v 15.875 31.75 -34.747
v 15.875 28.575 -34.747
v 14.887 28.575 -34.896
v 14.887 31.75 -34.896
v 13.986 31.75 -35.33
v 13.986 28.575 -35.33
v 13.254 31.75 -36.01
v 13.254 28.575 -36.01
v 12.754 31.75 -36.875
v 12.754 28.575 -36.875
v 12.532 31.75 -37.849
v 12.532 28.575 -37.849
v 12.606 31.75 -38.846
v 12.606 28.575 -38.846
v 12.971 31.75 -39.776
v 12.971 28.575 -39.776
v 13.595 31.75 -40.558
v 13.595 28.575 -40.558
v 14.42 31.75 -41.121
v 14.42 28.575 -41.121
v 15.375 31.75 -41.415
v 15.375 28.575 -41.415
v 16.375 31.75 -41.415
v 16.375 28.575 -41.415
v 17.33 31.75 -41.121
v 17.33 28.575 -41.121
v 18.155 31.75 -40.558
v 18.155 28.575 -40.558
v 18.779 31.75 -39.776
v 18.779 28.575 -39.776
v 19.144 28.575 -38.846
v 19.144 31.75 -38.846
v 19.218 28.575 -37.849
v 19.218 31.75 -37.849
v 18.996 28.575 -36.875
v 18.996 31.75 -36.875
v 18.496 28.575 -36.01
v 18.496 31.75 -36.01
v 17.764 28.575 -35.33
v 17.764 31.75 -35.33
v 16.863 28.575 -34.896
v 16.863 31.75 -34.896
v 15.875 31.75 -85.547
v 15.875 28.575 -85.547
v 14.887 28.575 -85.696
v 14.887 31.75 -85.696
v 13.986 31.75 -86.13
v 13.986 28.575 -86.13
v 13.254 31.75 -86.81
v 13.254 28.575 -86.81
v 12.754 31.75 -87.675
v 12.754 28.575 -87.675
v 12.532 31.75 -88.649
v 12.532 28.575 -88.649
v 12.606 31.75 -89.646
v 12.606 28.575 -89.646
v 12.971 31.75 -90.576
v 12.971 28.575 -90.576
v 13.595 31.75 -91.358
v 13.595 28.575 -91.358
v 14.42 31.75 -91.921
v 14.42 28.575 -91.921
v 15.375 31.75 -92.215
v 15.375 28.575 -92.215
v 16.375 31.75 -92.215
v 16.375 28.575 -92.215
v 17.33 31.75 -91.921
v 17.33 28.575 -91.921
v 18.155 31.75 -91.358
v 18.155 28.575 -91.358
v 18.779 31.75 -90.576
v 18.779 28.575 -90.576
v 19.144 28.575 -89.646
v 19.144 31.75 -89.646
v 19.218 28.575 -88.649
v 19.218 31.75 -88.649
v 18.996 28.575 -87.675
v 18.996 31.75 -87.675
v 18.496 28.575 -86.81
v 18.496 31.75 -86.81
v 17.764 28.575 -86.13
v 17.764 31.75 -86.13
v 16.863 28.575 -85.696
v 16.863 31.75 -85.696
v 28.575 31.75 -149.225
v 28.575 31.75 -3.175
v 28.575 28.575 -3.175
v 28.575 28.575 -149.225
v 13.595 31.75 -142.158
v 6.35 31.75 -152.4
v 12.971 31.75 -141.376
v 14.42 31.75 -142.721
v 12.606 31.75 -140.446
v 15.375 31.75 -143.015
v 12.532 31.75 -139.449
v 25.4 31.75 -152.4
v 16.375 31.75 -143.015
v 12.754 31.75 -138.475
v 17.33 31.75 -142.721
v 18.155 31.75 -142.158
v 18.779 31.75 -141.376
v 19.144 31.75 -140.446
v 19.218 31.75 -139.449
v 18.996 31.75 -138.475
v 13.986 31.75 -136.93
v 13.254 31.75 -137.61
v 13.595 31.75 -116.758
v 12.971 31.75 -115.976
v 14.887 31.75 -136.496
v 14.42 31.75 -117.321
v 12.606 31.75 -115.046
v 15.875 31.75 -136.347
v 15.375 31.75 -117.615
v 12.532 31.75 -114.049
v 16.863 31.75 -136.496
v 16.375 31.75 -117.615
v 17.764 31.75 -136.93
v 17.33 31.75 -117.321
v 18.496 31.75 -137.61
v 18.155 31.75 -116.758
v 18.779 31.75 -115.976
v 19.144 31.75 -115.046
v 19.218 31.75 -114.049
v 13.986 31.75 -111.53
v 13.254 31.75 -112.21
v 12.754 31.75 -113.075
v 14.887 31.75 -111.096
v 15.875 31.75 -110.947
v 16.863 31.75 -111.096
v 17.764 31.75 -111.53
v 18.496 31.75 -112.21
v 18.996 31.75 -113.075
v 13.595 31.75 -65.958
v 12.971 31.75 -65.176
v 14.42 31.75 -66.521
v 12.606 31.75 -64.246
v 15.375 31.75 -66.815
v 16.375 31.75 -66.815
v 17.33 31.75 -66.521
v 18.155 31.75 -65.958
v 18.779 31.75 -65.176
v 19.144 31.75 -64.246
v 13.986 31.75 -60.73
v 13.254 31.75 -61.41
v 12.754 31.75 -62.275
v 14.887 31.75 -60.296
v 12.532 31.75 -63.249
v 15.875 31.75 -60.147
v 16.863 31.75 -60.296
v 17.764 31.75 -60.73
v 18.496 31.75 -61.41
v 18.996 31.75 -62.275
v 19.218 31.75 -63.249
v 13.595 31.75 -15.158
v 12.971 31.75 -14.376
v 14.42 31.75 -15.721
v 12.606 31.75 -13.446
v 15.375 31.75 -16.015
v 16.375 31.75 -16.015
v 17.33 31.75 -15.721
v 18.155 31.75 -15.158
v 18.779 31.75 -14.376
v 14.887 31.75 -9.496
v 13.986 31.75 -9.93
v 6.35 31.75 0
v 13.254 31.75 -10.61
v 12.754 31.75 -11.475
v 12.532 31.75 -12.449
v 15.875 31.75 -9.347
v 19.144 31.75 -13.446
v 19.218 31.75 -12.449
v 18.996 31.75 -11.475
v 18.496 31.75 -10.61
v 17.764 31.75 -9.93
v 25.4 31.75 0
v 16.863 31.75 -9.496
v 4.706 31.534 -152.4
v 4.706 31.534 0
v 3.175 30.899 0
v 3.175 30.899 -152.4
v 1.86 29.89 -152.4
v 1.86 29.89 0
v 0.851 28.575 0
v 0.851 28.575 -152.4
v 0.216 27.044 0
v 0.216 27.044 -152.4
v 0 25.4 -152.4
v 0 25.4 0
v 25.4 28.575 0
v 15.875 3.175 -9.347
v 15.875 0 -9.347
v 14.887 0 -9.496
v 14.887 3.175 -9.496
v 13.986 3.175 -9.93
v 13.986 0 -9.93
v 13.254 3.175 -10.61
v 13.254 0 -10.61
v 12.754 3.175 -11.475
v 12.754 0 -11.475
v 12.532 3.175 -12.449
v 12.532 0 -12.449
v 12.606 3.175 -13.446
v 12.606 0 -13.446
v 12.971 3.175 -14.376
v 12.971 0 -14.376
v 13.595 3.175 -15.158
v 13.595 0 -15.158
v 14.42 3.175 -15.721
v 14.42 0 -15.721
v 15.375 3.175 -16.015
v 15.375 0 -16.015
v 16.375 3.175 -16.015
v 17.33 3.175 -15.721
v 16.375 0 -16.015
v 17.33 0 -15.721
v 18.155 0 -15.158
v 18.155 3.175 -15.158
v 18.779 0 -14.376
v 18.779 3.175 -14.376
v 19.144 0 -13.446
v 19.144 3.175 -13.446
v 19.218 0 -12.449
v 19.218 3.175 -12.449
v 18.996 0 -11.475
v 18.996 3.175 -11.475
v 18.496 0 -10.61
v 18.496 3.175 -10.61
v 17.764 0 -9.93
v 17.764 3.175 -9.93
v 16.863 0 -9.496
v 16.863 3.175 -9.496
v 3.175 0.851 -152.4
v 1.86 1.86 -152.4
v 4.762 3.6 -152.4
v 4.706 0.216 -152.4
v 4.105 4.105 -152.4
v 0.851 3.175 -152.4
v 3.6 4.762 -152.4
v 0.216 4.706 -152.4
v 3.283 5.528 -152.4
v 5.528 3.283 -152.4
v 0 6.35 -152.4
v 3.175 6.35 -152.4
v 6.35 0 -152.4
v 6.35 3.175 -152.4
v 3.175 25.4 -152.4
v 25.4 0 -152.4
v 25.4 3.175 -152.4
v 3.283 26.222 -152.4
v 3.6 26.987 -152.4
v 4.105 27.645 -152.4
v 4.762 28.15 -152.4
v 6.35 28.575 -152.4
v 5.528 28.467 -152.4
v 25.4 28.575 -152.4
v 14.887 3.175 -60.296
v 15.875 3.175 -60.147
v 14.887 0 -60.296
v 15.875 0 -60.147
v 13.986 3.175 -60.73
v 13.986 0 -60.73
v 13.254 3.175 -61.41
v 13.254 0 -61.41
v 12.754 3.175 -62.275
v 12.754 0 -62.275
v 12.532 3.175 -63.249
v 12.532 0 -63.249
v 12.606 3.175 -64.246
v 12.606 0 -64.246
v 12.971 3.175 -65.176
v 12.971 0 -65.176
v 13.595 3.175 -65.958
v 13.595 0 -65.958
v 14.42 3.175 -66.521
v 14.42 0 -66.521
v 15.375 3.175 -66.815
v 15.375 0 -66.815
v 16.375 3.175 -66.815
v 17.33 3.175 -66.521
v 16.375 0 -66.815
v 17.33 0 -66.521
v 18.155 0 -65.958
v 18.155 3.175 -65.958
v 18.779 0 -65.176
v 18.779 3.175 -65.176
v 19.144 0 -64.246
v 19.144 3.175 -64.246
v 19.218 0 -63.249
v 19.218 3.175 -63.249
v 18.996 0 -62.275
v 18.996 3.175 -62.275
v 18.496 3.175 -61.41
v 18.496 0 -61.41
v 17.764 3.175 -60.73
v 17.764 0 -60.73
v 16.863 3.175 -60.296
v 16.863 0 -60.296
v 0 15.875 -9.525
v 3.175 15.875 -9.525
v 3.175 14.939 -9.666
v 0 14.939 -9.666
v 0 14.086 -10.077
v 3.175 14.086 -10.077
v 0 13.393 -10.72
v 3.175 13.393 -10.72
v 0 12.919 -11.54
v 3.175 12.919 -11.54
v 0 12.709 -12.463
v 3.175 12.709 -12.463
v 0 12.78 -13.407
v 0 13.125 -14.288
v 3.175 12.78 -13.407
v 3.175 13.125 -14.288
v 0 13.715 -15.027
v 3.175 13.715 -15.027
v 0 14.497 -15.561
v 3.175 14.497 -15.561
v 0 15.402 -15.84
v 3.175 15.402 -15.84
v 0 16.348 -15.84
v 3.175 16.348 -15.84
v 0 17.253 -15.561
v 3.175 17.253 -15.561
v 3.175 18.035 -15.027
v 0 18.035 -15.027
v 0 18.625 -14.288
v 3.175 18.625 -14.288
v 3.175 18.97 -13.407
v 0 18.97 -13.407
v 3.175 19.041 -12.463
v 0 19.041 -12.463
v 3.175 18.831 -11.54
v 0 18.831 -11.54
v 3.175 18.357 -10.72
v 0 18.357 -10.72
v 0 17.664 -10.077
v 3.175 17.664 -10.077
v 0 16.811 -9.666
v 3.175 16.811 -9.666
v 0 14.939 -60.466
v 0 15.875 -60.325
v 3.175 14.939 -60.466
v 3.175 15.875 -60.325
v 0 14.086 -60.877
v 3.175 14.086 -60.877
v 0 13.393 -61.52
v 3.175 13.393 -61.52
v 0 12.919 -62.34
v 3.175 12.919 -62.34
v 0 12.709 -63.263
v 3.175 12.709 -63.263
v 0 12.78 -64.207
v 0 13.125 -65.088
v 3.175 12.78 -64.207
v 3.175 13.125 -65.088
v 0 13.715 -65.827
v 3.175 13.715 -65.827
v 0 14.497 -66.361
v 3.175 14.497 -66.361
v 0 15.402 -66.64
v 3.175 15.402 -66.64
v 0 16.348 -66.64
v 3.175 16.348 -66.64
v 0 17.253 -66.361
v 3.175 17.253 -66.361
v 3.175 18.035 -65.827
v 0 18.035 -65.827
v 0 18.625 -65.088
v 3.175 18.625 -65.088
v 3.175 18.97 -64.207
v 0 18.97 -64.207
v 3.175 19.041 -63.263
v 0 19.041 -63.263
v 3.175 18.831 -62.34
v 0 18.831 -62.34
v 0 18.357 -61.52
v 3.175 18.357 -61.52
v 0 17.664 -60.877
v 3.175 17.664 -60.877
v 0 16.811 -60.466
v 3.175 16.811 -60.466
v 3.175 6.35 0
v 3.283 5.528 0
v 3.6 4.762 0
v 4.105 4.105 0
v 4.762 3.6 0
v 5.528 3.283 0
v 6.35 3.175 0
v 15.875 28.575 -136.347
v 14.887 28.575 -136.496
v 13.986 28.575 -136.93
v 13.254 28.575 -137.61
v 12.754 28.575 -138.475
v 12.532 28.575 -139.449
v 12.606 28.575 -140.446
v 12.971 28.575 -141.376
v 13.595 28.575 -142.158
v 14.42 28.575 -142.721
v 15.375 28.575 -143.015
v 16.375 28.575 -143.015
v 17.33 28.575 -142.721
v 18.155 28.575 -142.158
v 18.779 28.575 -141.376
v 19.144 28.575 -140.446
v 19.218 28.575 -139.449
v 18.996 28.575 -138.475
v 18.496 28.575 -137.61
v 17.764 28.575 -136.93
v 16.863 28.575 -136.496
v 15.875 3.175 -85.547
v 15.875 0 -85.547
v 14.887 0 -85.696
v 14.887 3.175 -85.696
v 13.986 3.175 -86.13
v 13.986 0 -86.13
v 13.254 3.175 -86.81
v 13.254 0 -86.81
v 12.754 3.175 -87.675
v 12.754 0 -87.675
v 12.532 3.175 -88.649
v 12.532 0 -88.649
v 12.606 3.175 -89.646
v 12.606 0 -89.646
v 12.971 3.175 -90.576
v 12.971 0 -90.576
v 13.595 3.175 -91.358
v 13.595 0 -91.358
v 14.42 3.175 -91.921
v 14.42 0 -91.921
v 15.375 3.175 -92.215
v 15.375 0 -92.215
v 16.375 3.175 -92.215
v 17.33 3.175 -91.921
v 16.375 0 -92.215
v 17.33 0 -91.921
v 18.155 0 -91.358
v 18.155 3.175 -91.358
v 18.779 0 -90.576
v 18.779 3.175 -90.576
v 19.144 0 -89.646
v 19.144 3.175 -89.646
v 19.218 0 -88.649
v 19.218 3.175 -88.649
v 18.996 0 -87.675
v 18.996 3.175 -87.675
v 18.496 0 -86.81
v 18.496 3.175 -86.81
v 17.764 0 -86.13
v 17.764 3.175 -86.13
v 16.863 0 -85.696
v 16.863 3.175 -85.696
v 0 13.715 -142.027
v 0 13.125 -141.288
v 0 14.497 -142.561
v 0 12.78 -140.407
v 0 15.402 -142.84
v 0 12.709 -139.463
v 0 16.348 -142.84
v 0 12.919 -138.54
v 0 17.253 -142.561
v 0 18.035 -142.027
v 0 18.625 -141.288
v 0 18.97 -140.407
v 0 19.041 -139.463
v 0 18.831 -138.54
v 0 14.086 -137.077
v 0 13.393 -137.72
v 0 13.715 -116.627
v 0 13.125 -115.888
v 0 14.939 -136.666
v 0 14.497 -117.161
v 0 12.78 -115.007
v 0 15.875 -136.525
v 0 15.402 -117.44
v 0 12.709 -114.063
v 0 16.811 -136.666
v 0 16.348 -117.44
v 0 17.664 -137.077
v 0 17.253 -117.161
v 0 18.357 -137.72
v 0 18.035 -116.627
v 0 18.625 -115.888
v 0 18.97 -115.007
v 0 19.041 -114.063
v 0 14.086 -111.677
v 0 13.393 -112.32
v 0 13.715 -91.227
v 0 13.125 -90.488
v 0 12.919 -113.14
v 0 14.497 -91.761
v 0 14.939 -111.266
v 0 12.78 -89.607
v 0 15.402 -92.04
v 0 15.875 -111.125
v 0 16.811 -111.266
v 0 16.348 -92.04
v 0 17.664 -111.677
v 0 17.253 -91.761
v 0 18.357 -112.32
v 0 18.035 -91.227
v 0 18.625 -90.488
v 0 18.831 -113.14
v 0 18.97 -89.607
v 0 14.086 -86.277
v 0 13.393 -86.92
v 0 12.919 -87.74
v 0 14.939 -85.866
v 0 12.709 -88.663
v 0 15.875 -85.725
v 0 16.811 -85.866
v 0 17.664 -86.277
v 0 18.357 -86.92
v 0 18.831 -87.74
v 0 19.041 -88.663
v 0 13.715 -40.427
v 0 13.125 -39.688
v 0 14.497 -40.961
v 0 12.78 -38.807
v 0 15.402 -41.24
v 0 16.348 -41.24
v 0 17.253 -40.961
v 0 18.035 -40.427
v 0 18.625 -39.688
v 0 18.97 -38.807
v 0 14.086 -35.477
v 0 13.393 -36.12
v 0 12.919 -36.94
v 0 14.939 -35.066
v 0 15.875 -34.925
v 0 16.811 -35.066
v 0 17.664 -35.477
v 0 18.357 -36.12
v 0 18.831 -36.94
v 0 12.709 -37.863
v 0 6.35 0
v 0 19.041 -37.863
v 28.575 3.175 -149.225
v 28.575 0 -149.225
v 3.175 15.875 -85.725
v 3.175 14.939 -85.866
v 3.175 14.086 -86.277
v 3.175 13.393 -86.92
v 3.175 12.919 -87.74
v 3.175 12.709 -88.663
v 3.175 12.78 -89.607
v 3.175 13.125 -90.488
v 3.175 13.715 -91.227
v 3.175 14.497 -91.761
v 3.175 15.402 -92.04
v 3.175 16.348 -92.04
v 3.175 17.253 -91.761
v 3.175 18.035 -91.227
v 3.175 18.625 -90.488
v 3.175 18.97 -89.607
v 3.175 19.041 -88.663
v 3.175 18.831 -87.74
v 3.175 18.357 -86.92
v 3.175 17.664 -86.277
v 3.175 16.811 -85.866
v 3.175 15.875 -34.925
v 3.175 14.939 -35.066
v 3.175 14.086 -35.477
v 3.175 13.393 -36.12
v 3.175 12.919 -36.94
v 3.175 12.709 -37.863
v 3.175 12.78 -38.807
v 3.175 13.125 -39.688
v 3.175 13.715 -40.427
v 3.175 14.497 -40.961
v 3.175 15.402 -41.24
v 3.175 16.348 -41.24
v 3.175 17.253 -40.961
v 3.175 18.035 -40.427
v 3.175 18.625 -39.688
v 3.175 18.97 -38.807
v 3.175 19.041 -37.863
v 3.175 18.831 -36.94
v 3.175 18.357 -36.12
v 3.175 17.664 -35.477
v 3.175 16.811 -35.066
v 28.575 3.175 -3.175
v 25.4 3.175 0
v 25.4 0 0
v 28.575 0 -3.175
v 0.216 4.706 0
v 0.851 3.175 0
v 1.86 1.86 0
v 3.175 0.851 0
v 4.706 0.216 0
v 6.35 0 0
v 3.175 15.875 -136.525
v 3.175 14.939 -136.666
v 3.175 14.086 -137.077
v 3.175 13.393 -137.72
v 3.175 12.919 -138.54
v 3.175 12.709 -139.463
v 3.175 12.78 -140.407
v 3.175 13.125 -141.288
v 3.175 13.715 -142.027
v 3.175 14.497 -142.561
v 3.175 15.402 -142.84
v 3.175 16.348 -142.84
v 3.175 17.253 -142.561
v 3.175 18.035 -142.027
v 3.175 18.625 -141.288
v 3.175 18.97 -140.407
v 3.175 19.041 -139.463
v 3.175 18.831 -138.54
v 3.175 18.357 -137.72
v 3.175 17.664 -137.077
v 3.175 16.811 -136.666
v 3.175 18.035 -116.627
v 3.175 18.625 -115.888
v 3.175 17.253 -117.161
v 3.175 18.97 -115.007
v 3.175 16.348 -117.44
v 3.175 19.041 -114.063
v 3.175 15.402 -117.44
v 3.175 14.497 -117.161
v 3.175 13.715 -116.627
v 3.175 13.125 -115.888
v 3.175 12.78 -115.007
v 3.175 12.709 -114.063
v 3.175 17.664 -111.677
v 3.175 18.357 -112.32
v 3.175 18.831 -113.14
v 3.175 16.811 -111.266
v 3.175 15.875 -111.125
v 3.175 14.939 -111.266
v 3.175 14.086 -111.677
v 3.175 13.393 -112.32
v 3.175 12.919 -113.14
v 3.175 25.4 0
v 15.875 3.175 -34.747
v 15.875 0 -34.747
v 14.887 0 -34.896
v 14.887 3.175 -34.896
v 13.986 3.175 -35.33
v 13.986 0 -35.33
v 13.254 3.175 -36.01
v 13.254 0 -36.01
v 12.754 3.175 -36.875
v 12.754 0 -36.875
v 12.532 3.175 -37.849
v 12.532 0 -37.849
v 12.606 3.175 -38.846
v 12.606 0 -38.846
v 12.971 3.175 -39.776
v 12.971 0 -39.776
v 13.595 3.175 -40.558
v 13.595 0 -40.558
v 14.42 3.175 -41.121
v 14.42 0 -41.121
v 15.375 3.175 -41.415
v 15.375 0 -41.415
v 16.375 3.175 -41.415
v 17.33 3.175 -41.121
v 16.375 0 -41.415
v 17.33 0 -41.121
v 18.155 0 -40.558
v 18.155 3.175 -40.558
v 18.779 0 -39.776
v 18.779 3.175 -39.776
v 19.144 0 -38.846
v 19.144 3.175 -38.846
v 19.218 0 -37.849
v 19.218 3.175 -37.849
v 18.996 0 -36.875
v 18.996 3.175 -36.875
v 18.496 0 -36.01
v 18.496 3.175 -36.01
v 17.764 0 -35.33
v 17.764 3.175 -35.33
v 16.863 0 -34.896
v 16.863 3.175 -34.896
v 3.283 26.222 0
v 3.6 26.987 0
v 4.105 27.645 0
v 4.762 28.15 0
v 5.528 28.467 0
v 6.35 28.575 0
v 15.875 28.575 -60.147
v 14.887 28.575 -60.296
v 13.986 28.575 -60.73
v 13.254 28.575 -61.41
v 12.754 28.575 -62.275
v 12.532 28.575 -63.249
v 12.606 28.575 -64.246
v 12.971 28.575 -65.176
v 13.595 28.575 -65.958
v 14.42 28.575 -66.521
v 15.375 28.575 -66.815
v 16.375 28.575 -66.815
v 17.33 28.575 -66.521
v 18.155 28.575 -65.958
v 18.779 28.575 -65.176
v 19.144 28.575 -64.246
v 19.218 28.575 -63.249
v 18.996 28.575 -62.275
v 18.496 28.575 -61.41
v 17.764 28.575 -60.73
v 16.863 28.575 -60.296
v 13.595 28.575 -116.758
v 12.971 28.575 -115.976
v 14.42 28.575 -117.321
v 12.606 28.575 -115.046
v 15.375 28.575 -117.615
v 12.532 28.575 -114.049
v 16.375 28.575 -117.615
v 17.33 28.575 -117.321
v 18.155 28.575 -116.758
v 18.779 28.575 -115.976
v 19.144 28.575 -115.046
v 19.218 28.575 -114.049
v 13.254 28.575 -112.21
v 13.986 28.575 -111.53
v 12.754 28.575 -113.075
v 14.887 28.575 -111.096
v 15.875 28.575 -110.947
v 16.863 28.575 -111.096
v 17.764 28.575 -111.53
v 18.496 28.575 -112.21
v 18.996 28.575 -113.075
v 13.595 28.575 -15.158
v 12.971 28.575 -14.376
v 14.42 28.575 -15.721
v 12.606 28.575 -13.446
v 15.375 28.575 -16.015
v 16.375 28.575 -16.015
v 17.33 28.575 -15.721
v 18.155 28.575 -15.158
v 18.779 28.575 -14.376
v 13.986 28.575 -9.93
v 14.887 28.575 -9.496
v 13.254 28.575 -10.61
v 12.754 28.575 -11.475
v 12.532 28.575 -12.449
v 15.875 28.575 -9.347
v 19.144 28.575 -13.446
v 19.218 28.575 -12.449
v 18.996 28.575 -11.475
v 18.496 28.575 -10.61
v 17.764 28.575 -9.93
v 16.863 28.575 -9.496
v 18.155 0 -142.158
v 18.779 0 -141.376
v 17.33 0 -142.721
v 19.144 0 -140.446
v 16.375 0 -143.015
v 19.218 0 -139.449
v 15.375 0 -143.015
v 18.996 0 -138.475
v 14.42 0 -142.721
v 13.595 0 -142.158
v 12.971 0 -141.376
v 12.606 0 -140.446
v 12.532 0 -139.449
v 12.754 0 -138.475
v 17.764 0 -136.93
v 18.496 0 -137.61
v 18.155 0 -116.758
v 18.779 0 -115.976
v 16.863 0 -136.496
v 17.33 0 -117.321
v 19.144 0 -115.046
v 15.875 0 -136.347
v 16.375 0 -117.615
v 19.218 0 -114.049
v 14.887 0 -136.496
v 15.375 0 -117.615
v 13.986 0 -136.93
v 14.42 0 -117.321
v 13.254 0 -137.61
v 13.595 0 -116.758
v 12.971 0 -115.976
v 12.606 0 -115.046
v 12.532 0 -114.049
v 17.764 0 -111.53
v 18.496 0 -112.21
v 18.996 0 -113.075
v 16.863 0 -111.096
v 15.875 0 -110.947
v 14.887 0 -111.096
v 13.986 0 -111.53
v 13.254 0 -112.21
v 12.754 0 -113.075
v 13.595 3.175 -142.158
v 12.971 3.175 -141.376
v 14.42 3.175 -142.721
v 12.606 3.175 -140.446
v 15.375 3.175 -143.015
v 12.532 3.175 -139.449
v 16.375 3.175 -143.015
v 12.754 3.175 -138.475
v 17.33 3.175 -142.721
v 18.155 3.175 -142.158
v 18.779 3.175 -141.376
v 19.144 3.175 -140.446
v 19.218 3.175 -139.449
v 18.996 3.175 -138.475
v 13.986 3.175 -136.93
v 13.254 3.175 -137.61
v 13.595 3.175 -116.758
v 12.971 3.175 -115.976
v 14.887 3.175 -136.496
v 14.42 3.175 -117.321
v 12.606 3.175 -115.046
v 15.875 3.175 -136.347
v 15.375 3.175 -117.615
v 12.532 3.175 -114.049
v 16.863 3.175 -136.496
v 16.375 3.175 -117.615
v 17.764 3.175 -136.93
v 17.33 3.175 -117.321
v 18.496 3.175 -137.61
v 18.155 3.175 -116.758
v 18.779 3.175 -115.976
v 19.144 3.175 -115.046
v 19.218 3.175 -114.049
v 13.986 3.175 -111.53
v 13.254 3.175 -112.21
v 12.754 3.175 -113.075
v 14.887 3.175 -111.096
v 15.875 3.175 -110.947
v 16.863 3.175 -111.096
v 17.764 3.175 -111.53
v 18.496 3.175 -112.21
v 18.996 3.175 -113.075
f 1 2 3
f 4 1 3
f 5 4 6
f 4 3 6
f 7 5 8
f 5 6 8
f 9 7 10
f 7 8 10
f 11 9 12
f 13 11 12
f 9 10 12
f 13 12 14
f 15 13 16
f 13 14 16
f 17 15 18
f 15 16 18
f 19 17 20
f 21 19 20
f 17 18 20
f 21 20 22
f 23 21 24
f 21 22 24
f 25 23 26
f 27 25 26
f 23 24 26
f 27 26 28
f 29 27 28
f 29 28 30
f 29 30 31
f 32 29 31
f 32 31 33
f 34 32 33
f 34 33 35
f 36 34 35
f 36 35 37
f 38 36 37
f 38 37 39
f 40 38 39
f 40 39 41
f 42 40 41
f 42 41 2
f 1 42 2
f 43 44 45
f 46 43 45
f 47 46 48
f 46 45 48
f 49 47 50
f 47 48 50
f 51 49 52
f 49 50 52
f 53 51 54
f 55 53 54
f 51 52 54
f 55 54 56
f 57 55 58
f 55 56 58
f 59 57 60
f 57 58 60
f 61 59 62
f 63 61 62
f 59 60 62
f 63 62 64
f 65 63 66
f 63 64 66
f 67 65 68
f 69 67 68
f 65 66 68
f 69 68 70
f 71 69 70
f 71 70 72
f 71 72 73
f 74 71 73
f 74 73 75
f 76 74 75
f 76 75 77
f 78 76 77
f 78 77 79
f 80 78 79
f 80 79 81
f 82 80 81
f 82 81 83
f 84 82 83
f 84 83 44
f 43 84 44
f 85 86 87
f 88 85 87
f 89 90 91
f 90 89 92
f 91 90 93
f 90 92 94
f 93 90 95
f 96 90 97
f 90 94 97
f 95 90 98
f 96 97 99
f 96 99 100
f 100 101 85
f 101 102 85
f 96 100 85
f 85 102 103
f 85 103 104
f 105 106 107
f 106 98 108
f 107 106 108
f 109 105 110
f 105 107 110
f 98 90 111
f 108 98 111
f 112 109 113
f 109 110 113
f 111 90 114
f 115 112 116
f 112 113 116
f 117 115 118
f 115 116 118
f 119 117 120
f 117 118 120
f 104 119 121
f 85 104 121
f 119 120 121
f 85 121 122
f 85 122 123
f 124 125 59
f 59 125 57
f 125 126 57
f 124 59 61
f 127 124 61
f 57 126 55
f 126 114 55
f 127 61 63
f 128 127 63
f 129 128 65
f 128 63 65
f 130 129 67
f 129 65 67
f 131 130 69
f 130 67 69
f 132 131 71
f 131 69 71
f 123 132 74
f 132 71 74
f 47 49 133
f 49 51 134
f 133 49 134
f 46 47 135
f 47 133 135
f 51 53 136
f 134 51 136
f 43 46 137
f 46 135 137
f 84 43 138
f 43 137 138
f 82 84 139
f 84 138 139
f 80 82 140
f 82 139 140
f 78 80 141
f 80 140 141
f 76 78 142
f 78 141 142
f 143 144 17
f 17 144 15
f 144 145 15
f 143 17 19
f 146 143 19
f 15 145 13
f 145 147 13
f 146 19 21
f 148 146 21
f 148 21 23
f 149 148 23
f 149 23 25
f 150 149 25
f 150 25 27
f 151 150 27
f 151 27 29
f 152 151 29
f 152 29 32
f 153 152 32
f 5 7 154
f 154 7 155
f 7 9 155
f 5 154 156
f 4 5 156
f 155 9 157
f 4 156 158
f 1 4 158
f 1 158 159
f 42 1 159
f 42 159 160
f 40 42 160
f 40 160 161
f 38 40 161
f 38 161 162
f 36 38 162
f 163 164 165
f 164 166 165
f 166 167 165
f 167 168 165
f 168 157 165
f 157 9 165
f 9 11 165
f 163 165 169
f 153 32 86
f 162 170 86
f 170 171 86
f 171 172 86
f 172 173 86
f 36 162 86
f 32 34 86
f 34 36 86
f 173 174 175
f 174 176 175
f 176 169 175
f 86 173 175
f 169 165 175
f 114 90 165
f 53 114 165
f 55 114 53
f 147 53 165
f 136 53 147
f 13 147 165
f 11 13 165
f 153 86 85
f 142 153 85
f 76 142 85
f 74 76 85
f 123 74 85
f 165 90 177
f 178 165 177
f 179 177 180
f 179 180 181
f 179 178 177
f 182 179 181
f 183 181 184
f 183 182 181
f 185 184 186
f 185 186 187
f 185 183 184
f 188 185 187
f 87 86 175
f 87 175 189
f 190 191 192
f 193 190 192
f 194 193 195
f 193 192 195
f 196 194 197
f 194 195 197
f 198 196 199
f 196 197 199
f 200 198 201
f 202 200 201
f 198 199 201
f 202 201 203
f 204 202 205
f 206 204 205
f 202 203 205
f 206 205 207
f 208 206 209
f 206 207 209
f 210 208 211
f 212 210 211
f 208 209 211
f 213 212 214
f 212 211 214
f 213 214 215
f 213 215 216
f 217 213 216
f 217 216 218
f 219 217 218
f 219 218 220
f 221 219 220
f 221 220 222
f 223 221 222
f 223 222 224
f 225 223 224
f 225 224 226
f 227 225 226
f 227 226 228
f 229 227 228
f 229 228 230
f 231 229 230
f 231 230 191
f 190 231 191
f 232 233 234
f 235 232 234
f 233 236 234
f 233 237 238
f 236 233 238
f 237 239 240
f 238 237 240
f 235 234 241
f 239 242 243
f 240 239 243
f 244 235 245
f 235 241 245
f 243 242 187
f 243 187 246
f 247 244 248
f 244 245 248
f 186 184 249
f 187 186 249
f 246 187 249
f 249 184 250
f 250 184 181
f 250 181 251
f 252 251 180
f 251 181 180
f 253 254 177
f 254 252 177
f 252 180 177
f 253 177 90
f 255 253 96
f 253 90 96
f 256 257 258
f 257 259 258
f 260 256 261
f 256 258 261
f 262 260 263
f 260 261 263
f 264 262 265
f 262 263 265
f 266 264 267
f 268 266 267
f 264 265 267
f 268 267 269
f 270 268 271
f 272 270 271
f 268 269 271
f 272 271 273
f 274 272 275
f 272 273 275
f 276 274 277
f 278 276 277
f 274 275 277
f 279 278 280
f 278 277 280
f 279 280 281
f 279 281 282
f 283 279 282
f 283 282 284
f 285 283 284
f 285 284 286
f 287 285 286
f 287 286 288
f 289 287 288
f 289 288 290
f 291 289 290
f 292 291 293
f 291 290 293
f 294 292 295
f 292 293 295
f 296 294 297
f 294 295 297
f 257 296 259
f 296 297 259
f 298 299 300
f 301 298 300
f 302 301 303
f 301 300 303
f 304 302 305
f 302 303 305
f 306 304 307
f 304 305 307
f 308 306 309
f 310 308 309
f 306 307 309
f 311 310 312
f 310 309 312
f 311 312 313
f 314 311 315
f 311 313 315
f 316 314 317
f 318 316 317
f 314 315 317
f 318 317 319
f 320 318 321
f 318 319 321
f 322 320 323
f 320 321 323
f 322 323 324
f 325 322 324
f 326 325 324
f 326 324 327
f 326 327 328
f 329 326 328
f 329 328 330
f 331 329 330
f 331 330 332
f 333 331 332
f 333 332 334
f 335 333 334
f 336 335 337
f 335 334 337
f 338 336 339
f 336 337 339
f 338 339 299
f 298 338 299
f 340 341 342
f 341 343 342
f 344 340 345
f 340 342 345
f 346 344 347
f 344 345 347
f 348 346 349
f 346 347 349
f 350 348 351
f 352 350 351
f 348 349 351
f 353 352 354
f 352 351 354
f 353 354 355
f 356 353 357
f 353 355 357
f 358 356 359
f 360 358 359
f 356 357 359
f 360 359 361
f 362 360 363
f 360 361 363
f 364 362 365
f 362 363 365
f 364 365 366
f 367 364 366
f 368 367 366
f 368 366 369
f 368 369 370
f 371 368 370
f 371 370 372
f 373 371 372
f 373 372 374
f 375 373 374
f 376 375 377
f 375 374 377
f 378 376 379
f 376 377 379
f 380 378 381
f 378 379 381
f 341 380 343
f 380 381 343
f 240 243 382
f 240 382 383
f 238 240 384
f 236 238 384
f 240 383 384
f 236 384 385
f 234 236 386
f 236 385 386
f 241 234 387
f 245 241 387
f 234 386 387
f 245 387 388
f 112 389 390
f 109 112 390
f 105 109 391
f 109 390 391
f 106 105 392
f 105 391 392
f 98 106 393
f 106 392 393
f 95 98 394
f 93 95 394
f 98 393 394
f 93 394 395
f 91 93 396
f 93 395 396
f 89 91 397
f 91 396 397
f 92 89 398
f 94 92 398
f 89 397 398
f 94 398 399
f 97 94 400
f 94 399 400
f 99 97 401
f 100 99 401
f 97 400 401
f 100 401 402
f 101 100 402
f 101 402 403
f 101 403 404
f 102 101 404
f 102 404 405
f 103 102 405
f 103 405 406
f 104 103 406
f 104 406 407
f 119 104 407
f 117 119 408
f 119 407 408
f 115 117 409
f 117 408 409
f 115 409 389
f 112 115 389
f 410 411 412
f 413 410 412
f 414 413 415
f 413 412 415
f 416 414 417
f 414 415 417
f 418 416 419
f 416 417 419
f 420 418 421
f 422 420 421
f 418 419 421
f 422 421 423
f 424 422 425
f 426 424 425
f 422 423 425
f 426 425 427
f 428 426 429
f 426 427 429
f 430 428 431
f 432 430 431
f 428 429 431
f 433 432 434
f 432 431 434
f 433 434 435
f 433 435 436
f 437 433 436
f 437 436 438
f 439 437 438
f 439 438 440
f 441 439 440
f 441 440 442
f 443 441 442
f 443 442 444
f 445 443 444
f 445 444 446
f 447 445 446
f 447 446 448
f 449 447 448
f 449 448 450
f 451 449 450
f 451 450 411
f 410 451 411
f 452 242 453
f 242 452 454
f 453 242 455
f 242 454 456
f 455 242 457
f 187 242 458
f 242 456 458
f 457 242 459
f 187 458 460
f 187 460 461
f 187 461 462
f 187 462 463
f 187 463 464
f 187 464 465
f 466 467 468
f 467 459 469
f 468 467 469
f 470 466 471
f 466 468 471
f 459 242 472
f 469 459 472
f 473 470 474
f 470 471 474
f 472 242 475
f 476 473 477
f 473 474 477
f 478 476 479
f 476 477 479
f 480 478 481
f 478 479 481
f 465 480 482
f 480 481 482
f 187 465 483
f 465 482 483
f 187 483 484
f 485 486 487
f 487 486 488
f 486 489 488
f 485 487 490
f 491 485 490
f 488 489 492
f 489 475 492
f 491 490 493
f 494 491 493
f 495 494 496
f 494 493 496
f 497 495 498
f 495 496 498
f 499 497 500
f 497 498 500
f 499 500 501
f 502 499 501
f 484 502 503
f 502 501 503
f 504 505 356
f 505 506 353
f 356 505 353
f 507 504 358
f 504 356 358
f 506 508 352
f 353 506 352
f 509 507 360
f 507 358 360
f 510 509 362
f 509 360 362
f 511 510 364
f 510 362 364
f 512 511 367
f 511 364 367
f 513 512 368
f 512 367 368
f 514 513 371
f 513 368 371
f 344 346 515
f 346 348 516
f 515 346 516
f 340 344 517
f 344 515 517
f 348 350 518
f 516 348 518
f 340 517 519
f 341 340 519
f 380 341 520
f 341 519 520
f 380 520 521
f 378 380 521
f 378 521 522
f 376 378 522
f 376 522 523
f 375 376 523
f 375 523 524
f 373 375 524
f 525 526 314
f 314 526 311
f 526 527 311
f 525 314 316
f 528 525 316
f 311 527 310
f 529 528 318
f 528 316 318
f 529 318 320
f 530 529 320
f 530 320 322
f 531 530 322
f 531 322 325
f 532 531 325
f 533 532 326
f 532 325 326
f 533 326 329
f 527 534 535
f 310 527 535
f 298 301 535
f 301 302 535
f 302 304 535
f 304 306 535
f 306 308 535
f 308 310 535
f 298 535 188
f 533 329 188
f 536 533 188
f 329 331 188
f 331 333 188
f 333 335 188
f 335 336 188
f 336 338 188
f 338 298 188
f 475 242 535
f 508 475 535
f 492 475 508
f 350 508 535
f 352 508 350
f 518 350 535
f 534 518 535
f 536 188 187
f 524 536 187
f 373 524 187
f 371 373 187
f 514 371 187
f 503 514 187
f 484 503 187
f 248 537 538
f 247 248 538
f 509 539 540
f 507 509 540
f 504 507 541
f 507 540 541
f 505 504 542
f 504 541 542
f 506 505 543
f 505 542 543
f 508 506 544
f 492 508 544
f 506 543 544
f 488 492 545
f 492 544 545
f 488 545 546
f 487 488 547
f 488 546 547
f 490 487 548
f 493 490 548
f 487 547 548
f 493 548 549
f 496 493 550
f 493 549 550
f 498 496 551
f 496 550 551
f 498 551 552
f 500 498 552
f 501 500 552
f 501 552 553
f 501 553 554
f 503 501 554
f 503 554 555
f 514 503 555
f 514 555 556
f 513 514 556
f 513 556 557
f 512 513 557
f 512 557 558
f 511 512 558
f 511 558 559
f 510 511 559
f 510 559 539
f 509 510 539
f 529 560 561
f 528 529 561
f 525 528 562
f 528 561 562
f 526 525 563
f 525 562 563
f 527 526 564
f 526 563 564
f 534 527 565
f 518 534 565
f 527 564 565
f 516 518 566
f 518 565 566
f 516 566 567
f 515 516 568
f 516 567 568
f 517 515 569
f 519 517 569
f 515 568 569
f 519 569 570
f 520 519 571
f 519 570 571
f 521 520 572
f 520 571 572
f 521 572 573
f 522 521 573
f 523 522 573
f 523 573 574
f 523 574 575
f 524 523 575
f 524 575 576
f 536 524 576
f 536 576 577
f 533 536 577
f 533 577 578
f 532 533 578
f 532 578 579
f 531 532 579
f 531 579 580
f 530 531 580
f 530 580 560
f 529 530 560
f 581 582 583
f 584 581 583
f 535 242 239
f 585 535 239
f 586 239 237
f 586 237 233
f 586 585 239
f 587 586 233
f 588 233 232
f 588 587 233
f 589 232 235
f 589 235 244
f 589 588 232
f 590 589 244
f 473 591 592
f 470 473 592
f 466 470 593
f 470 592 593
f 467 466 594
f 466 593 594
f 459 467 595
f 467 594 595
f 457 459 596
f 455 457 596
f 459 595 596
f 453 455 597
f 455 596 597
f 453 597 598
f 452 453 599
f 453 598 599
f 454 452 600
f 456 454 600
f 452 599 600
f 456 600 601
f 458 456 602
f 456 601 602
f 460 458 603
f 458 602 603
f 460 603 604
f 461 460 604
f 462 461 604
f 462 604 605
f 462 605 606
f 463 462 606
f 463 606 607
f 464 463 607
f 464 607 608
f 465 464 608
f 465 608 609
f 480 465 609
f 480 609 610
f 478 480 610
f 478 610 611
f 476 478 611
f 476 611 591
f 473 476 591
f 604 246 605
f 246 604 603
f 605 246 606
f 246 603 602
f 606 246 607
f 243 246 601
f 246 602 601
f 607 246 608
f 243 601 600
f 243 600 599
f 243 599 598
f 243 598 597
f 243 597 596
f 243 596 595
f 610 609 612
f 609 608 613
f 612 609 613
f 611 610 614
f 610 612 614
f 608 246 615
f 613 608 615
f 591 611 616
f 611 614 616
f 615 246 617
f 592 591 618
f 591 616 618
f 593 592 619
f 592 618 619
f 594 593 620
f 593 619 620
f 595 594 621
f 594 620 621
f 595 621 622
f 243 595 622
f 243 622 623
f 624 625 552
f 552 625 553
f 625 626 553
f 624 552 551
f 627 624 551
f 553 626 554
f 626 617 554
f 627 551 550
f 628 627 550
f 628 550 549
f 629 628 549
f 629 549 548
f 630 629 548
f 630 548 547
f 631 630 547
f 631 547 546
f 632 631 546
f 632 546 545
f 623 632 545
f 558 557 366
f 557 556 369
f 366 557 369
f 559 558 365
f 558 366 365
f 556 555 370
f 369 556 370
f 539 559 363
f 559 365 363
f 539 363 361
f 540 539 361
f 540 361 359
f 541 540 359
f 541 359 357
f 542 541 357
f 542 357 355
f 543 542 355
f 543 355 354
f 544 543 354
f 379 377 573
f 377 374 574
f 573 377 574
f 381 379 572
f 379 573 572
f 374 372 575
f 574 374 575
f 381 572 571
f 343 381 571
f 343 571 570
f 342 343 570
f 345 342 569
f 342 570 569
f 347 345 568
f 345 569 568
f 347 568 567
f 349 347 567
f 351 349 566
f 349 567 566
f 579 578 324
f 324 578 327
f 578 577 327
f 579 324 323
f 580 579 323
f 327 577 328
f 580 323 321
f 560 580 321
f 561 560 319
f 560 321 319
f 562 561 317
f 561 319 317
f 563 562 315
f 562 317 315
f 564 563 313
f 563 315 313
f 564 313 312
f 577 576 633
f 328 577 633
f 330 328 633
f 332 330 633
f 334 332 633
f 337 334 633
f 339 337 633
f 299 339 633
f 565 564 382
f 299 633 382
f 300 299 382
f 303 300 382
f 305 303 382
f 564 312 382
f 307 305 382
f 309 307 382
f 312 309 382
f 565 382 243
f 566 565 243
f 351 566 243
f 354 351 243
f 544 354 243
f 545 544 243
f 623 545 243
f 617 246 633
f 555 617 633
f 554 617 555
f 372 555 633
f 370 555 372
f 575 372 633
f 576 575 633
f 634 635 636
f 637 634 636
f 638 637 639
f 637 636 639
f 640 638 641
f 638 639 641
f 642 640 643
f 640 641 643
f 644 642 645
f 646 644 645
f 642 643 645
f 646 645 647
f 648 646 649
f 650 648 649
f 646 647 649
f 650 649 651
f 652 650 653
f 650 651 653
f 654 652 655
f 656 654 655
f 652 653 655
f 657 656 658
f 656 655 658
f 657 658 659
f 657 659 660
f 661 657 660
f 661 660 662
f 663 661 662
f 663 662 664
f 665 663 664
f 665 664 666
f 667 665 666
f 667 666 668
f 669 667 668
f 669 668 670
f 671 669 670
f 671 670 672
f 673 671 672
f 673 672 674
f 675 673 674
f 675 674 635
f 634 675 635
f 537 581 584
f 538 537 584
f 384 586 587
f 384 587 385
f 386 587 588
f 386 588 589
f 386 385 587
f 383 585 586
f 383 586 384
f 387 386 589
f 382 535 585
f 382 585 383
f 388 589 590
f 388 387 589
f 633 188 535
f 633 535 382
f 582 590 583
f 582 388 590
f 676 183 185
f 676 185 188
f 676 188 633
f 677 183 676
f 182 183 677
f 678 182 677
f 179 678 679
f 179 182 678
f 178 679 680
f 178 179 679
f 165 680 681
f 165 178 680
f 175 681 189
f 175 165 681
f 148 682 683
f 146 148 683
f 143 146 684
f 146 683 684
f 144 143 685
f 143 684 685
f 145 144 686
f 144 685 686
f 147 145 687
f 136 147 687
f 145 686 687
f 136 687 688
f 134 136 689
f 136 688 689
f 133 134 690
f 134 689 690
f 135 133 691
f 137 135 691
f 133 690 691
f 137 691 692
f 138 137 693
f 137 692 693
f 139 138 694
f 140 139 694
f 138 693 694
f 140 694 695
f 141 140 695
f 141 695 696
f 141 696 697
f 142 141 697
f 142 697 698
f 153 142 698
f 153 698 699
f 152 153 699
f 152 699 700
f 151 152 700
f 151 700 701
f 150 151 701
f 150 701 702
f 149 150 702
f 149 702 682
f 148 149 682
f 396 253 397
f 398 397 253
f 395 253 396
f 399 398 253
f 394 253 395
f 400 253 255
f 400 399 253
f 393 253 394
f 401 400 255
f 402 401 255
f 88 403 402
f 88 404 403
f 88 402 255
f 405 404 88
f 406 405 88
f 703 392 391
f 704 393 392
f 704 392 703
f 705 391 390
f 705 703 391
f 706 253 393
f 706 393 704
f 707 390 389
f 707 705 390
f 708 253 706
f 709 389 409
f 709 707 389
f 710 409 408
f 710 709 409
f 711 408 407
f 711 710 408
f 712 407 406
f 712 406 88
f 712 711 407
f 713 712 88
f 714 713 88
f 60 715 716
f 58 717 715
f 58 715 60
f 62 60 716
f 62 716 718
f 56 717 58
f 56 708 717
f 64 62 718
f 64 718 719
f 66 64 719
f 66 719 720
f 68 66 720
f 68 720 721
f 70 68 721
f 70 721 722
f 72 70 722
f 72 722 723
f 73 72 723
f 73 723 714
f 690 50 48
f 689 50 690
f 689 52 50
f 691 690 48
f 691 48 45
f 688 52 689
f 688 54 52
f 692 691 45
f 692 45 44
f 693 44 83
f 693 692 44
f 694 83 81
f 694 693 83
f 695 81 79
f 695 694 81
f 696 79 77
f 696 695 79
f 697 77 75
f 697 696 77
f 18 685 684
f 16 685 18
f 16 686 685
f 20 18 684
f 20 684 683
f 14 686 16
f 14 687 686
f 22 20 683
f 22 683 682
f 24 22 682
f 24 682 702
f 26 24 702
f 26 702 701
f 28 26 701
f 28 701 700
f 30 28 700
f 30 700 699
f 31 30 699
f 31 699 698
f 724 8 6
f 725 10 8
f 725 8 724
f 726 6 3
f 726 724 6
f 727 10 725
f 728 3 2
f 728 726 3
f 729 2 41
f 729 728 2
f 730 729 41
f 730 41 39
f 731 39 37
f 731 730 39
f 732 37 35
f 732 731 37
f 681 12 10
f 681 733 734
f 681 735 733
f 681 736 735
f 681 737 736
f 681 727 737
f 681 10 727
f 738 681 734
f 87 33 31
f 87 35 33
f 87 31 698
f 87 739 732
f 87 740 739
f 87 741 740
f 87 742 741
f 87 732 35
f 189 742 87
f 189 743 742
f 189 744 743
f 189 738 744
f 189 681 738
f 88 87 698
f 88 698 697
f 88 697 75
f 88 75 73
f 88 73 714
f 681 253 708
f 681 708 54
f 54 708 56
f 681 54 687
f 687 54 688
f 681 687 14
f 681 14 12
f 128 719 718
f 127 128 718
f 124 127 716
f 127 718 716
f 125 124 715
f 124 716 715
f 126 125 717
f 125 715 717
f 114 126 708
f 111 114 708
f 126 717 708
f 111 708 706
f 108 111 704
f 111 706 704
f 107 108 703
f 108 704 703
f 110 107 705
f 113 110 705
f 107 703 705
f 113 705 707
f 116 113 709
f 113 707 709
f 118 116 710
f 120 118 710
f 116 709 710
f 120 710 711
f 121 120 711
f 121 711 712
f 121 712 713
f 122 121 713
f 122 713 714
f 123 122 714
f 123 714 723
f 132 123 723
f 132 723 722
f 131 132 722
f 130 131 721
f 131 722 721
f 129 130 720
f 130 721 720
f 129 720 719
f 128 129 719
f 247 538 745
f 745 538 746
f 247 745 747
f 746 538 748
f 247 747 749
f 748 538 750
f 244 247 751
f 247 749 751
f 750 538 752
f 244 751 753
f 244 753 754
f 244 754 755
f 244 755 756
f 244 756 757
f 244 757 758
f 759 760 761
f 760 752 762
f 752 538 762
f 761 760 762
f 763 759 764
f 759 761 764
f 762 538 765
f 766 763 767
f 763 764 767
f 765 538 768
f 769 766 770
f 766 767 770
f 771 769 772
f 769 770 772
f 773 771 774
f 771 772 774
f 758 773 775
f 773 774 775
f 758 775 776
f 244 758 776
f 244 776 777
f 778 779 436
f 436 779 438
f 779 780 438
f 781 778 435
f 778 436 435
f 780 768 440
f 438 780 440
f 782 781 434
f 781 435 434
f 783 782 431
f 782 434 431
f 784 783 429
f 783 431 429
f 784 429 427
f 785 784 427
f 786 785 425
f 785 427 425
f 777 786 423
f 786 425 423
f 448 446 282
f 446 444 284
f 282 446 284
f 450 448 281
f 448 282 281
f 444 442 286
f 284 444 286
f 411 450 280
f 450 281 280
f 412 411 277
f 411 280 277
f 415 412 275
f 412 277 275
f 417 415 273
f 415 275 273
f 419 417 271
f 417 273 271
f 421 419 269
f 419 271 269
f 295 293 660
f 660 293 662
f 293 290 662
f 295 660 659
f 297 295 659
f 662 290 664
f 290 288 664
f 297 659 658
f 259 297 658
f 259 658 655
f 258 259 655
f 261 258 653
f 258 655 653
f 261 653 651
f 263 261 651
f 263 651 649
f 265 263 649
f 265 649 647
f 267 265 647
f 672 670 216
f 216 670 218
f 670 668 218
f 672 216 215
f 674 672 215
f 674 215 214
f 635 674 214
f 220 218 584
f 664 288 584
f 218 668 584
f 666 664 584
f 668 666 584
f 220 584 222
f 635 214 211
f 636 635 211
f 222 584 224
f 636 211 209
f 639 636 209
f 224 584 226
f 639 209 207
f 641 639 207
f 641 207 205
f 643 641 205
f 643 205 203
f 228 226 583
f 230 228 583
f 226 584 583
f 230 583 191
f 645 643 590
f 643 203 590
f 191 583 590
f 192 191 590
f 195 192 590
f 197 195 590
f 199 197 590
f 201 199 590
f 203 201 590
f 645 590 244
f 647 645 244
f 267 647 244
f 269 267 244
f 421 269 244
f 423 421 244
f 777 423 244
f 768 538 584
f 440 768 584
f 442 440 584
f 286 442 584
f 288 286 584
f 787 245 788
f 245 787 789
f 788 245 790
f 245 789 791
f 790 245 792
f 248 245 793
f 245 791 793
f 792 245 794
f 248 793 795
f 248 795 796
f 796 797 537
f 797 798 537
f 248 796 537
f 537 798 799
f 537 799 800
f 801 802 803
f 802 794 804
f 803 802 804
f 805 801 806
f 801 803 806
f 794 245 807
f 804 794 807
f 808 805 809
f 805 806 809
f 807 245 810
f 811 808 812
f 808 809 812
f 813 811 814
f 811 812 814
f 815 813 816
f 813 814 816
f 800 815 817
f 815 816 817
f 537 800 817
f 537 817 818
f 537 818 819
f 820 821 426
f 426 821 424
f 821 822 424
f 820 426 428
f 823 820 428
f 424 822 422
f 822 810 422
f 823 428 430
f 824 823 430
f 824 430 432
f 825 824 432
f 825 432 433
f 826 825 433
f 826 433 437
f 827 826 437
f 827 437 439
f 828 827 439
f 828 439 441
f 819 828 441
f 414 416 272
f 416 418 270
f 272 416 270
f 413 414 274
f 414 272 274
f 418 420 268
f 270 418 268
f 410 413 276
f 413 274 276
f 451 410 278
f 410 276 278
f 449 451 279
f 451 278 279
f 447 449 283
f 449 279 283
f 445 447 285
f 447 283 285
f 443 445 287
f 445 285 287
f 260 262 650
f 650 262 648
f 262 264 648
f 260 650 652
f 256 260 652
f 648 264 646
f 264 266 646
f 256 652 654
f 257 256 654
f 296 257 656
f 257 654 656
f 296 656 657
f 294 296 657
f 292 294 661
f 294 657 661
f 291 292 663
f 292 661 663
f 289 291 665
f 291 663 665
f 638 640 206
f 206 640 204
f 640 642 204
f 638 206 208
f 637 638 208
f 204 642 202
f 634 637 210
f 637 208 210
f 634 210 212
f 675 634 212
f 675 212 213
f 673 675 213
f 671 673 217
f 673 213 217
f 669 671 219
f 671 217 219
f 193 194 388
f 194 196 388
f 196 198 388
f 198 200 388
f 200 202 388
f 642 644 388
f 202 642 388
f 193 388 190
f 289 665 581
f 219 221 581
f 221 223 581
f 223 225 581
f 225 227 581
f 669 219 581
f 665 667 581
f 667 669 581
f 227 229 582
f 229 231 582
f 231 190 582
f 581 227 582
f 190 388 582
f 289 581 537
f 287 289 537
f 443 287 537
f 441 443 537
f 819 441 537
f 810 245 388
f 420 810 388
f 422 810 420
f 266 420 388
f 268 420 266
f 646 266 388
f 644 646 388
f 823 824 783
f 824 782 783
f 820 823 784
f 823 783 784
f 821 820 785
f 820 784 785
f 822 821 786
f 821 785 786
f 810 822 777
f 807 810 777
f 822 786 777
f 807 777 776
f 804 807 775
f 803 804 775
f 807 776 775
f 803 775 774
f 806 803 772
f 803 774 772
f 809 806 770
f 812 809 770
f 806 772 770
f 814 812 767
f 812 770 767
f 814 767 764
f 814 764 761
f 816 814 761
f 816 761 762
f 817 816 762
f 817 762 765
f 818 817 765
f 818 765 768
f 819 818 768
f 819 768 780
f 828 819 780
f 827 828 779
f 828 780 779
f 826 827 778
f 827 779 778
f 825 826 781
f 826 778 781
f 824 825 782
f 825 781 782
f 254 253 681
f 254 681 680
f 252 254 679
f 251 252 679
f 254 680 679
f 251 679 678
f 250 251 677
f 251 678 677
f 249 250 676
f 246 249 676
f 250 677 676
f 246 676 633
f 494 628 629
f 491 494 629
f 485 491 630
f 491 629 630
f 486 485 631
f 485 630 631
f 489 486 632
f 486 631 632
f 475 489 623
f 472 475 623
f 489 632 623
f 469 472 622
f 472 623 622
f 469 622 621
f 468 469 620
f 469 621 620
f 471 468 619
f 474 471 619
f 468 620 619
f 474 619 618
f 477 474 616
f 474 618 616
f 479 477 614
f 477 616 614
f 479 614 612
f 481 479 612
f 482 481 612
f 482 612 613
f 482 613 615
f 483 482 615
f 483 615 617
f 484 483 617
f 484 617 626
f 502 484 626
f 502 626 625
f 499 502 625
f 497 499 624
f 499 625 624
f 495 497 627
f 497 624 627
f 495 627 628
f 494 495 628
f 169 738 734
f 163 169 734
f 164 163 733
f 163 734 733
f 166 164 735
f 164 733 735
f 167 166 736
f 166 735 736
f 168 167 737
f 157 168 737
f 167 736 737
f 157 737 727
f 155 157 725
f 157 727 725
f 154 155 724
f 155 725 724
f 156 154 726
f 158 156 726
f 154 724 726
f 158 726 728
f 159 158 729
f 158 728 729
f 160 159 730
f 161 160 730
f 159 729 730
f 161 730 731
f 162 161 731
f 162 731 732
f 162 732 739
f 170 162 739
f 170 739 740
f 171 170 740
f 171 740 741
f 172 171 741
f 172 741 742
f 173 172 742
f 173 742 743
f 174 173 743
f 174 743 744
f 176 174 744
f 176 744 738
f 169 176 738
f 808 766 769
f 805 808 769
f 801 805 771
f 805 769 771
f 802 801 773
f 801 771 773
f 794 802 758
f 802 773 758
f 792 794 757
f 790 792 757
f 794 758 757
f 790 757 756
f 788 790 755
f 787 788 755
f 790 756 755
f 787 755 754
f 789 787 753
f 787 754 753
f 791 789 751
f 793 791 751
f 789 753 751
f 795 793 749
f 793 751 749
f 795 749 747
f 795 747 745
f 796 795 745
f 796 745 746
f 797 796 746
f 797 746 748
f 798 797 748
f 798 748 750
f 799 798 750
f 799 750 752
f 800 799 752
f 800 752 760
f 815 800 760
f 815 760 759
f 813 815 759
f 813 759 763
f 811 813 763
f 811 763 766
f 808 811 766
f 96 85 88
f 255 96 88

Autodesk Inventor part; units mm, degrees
ref_plane "YZ Plane" through (0, 0, 0) normal (1, 0, 0) x (0, 1, 0)
ref_plane "XZ Plane" through (0, 0, 0) normal (0, 1, 0) x (-1, 0, 0)
ref_plane "XY Plane" through (0, 0, 0) normal (0, 0, 1) x (1, 0, 0)
sketch "Sketch1" plane through (0, 0, 0) normal (0, 0, 1) x (1, 0, 0)
  line L0 (6.35, 28.575) -> (25.4, 28.575)
  line L1 (6.35, 31.75) -> (25.4, 31.75)
  line L2 (25.4, 0) -> (6.35, 0)
  arc A0 (0, 6.35) -> (6.35, 0) centre (6.35, 6.35) ccw
  line L3 (0, 6.35) -> (0, 25.4)
  arc A1 (6.35, 31.75) -> (0, 25.4) centre (6.35, 25.4) ccw
  line L4 (6.35, 31.75) -> (25.4, 31.75)
  line L5 (25.4, 28.575) -> (6.35, 28.575)
  arc A2 (6.35, 28.575) -> (3.175, 25.4) centre (6.35, 25.4) ccw
  line L6 (3.175, 25.4) -> (3.175, 6.35)
  arc A3 (3.175, 6.35) -> (6.35, 3.175) centre (6.35, 6.35) ccw
  line L7 (6.35, 3.175) -> (25.4, 3.175)
  line L8 (28.575, 3.175) -> (28.575, 0)
  line L9 (25.4, 31.75) -> (28.575, 31.75)
  line L10 (28.575, 28.575) -> (25.4, 28.575)
  line L11 (28.575, 31.75) -> (28.575, 28.575)
  line L12 (28.575, 0) -> (25.4, 0)
  line L13 (28.575, 3.175) -> (28.575, 0)
  line L14 (25.4, 3.175) -> (28.575, 3.175)
  point P0 (0, 0)
extrude "Extrusion1" add sketch "Sketch1" against normal blind 152.4
chamfer "Chamfer1" distance 3.175 angle 45 4 edges at (28.575, 30.1625, 0) (28.575, 1.5875, 0) (28.575, 30.1625, -152.4) (28.575, 1.5875, -152.4)
sketch "Sketch2" plane through (6.35, 31.75, 0) normal (0, 1, 0) x (1, 0, 0)
  line L0 (19.05, 0) -> (0, 0) projected
  line L1 (22.225, 3.175) -> (22.225, 149.225) projected
  point P0 (-6.35, 0)
  point P1 (9.525, 12.7)
  dimension "d5" = 12.7
  dimension "d6" = 12.7
hole "Hole1" at (15.875, 31.75, -12.7) direction (0, -1, 0) diameter 6.7056 end through all
pattern_linear "Rectangular Pattern1" count 6 spacing 25.4 along (0, 0, -1) of "Hole1"
hole "Hole2" at (0, 15.875, -12.7) direction (1, 0, 0) diameter 6.35 end through all
pattern_linear "Rectangular Pattern2" count 6 spacing 25.4 along (0, 0, -1) of "Hole2"
properties part number "DBK_C-Channel_6" material "Aluminum 6061"
